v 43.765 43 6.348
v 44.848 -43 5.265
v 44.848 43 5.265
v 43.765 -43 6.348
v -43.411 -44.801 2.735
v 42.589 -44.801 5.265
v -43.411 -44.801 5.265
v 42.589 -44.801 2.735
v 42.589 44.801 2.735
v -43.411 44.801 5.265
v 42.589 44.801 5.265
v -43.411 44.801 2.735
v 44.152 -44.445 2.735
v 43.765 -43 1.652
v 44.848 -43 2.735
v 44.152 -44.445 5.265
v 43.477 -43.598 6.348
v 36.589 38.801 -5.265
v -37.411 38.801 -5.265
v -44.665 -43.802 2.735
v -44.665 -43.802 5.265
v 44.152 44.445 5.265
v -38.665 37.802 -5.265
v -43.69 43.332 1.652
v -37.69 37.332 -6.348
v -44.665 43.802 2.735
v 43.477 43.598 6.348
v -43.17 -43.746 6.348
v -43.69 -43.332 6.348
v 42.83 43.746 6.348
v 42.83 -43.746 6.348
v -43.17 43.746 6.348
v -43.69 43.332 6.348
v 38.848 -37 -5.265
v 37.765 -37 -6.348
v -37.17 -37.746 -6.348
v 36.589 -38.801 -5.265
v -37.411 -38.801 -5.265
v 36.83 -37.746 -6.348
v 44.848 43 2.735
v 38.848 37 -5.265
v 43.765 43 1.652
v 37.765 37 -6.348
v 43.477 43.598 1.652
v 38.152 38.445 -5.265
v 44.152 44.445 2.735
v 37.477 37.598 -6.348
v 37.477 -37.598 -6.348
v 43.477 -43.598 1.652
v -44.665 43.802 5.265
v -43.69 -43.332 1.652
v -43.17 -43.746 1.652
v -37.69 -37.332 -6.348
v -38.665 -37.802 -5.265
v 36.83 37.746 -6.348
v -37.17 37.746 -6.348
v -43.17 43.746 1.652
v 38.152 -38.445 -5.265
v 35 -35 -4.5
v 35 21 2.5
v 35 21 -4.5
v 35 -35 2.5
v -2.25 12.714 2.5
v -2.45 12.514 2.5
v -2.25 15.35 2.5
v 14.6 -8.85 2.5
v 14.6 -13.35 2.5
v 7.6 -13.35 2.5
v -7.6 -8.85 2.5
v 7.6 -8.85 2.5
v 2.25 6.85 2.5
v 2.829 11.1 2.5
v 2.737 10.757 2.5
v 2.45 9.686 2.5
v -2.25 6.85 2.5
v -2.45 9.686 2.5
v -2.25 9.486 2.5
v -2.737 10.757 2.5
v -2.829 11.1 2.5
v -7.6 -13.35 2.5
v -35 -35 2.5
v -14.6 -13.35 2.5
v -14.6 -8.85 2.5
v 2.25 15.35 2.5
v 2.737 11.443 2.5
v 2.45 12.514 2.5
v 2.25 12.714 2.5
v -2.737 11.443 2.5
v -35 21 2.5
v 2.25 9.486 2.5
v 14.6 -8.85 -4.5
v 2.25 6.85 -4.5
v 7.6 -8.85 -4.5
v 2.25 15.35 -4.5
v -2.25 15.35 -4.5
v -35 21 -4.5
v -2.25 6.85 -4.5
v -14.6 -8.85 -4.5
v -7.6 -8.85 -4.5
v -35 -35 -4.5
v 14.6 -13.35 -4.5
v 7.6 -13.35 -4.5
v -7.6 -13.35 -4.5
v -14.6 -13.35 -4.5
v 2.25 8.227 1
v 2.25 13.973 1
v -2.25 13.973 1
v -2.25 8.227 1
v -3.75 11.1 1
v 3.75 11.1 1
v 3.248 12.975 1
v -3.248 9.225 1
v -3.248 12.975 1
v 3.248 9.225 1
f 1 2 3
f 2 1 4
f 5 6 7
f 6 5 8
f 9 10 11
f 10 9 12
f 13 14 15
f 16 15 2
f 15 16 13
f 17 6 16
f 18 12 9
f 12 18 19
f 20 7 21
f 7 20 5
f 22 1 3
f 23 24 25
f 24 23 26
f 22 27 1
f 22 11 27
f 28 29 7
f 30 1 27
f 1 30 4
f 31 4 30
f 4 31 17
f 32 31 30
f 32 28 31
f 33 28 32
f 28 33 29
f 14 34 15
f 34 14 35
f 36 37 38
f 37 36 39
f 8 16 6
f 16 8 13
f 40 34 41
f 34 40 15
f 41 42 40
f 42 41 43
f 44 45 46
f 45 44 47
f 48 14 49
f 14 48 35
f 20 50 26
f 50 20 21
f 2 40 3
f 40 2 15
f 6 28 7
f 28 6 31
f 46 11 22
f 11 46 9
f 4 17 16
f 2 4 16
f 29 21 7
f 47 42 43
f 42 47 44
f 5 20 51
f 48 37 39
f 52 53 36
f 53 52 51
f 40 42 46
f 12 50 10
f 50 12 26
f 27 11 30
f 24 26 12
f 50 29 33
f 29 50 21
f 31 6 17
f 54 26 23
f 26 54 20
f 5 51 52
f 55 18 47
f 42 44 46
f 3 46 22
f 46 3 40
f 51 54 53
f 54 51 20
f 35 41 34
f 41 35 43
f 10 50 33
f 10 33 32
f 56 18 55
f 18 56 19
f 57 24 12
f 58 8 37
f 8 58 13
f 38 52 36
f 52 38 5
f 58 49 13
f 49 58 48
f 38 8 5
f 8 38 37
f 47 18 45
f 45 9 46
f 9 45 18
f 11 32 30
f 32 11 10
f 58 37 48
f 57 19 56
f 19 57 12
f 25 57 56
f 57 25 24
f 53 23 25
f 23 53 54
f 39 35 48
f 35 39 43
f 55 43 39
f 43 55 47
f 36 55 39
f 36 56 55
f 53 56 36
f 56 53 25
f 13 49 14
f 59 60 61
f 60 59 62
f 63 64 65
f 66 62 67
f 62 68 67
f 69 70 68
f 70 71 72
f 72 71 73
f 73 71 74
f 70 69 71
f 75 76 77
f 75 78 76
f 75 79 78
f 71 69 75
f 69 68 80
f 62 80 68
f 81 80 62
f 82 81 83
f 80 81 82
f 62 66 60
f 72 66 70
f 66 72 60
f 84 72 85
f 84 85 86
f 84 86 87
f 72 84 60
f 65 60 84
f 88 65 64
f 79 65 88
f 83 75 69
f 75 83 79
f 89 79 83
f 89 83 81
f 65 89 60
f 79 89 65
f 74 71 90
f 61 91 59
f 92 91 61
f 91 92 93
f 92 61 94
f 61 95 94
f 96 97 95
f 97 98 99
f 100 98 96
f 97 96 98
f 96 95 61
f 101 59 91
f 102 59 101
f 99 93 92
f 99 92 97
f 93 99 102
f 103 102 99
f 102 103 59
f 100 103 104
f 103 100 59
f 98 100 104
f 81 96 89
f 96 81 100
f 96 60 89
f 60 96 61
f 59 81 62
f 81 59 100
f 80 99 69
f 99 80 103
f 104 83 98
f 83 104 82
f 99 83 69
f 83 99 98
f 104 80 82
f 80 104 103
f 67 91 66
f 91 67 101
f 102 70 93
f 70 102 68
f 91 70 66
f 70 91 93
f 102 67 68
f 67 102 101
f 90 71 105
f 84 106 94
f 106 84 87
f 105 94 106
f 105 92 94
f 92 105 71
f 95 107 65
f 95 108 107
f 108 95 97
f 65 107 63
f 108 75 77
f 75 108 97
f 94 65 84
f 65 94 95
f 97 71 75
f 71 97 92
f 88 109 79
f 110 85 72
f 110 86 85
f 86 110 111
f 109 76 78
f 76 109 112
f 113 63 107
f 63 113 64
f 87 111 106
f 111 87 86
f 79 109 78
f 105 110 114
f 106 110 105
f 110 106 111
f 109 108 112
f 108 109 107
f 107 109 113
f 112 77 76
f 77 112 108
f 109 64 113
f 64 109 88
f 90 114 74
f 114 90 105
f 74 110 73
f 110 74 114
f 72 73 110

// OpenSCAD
// Parameters
faceplate_width = 86; //[60:172:1]
faceplate_height = 86; //[60:172:1]
faceplate_thickness = 9; //[5:18:1]
top_width_taper = 6; //[2:12:1]
edge_rounding_radius = 2; //[0.5:6:0.5]
rear_cavity_depth = 6; //[3:14:1]
rear_cavity_margin = 8; //[4:16:1]
rear_cavity_top_clearance = 14; //[8:28:1]
mounting_hole_pitch = 60.3; //[45:120:0.1]
mounting_hole_clearance_diameter = 3.8; //[3:5:0.1]
countersink_top_diameter = 8.5; //[6:14:0.1]
countersink_depth = 3; //[1:6:0.1]
counterbore_diameter = 0; //[0:14:0.1]
counterbore_depth = 0; //[0:8:0.1]
pin_live_neutral_center_x = 11.1; //[9:14:0.1]
pin_live_neutral_center_y = -11.1; //[-14:-8:0.1]
pin_earth_center_y = 11.1; //[8:14:0.1]
pin_ln_width_x = 7; //[5:10:0.1]
pin_ln_width_y = 4.5; //[3.5:7:0.1]
pin_earth_width_x = 4.5; //[3.5:7:0.1]
pin_earth_width_y = 8.5; //[6:12:0.1]
aperture_cut_depth = 12; //[8:25:1]
switch_offset_x = 18; //[10:30:0.5]
switch_offset_y = 18; //[10:30:0.5]
switch_feature_width = 28; //[18:45:1]
switch_feature_height = 18; //[12:30:1]
switch_feature_depth = 2; //[1:5:0.1]
earth_screw_hole = 1; //[0:1:1]
earth_screw_clearance_diameter = 3.2; //[2.5:4.5:0.1]
earth_screw_countersink_top_diameter = 7.5; //[6:12:0.1]
earth_screw_countersink_depth = 2.5; //[1:5:0.1]
overlap = 1; //[0.5:2:0.1]

// Mains Socket - complete geometry
module mains_socket() {
  color("White") {
    // Faceplate with rounded edges
    difference() {
      minkowski() {
        hull() {
          translate([0, 0, faceplate_thickness/2 - overlap/2])
            cube([faceplate_width, faceplate_height, overlap], center=true);
          translate([0, 0, -faceplate_thickness/2 + overlap/2])
            cube([faceplate_width - 2*top_width_taper, faceplate_height - 2*top_width_taper, overlap], center=true);
        }
        sphere(r=edge_rounding_radius, center=true);
      }
      // Rear cavity
      translate([0, -rear_cavity_top_clearance/2, -faceplate_thickness/2 + (rear_cavity_depth + overlap)/2])
        cube([faceplate_width - 2*rear_cavity_margin, faceplate_height - 2*rear_cavity_margin - rear_cavity_top_clearance, rear_cavity_depth + overlap], center=true);
    }
  }
}

// Mains Socket Holes - complete geometry
module mains_socket_holes() {
  color("Black") {
    union() {
      // Live and Neutral pin apertures
      translate([-pin_live_neutral_center_x, pin_live_neutral_center_y, 0])
        cube([pin_ln_width_x, pin_ln_width_y, aperture_cut_depth], center=true);
      translate([pin_live_neutral_center_x, pin_live_neutral_center_y, 0])
        cube([pin_ln_width_x, pin_ln_width_y, aperture_cut_depth], center=true);
      // Earth pin aperture
      translate([0, pin_earth_center_y, 0])
        cube([pin_earth_width_x, pin_earth_width_y, aperture_cut_depth], center=true);
    }
  }
}

// Mains Socket Earth Position - complete geometry
module mains_socket_earth_position() {
  if (earth_screw_hole) {
    color("Silver") {
      union() {
        // Earth screw hole
        translate([0, pin_earth_center_y, 0])
          cylinder(r=earth_screw_clearance_diameter/2, h=faceplate_thickness + 2*overlap, center=true);
        // Earth screw countersink
        translate([0, pin_earth_center_y, faceplate_thickness/2 - (earth_screw_countersink_depth + overlap)/2])
          cylinder(r1=earth_screw_countersink_top_diameter/2, r2=earth_screw_clearance_diameter/2, h=earth_screw_countersink_depth + overlap, center=true);
      }
    }
  }
}

// Assembly
module assembly() {
  mains_socket();
  mains_socket_holes();
  mains_socket_earth_position();
}

assembly();
